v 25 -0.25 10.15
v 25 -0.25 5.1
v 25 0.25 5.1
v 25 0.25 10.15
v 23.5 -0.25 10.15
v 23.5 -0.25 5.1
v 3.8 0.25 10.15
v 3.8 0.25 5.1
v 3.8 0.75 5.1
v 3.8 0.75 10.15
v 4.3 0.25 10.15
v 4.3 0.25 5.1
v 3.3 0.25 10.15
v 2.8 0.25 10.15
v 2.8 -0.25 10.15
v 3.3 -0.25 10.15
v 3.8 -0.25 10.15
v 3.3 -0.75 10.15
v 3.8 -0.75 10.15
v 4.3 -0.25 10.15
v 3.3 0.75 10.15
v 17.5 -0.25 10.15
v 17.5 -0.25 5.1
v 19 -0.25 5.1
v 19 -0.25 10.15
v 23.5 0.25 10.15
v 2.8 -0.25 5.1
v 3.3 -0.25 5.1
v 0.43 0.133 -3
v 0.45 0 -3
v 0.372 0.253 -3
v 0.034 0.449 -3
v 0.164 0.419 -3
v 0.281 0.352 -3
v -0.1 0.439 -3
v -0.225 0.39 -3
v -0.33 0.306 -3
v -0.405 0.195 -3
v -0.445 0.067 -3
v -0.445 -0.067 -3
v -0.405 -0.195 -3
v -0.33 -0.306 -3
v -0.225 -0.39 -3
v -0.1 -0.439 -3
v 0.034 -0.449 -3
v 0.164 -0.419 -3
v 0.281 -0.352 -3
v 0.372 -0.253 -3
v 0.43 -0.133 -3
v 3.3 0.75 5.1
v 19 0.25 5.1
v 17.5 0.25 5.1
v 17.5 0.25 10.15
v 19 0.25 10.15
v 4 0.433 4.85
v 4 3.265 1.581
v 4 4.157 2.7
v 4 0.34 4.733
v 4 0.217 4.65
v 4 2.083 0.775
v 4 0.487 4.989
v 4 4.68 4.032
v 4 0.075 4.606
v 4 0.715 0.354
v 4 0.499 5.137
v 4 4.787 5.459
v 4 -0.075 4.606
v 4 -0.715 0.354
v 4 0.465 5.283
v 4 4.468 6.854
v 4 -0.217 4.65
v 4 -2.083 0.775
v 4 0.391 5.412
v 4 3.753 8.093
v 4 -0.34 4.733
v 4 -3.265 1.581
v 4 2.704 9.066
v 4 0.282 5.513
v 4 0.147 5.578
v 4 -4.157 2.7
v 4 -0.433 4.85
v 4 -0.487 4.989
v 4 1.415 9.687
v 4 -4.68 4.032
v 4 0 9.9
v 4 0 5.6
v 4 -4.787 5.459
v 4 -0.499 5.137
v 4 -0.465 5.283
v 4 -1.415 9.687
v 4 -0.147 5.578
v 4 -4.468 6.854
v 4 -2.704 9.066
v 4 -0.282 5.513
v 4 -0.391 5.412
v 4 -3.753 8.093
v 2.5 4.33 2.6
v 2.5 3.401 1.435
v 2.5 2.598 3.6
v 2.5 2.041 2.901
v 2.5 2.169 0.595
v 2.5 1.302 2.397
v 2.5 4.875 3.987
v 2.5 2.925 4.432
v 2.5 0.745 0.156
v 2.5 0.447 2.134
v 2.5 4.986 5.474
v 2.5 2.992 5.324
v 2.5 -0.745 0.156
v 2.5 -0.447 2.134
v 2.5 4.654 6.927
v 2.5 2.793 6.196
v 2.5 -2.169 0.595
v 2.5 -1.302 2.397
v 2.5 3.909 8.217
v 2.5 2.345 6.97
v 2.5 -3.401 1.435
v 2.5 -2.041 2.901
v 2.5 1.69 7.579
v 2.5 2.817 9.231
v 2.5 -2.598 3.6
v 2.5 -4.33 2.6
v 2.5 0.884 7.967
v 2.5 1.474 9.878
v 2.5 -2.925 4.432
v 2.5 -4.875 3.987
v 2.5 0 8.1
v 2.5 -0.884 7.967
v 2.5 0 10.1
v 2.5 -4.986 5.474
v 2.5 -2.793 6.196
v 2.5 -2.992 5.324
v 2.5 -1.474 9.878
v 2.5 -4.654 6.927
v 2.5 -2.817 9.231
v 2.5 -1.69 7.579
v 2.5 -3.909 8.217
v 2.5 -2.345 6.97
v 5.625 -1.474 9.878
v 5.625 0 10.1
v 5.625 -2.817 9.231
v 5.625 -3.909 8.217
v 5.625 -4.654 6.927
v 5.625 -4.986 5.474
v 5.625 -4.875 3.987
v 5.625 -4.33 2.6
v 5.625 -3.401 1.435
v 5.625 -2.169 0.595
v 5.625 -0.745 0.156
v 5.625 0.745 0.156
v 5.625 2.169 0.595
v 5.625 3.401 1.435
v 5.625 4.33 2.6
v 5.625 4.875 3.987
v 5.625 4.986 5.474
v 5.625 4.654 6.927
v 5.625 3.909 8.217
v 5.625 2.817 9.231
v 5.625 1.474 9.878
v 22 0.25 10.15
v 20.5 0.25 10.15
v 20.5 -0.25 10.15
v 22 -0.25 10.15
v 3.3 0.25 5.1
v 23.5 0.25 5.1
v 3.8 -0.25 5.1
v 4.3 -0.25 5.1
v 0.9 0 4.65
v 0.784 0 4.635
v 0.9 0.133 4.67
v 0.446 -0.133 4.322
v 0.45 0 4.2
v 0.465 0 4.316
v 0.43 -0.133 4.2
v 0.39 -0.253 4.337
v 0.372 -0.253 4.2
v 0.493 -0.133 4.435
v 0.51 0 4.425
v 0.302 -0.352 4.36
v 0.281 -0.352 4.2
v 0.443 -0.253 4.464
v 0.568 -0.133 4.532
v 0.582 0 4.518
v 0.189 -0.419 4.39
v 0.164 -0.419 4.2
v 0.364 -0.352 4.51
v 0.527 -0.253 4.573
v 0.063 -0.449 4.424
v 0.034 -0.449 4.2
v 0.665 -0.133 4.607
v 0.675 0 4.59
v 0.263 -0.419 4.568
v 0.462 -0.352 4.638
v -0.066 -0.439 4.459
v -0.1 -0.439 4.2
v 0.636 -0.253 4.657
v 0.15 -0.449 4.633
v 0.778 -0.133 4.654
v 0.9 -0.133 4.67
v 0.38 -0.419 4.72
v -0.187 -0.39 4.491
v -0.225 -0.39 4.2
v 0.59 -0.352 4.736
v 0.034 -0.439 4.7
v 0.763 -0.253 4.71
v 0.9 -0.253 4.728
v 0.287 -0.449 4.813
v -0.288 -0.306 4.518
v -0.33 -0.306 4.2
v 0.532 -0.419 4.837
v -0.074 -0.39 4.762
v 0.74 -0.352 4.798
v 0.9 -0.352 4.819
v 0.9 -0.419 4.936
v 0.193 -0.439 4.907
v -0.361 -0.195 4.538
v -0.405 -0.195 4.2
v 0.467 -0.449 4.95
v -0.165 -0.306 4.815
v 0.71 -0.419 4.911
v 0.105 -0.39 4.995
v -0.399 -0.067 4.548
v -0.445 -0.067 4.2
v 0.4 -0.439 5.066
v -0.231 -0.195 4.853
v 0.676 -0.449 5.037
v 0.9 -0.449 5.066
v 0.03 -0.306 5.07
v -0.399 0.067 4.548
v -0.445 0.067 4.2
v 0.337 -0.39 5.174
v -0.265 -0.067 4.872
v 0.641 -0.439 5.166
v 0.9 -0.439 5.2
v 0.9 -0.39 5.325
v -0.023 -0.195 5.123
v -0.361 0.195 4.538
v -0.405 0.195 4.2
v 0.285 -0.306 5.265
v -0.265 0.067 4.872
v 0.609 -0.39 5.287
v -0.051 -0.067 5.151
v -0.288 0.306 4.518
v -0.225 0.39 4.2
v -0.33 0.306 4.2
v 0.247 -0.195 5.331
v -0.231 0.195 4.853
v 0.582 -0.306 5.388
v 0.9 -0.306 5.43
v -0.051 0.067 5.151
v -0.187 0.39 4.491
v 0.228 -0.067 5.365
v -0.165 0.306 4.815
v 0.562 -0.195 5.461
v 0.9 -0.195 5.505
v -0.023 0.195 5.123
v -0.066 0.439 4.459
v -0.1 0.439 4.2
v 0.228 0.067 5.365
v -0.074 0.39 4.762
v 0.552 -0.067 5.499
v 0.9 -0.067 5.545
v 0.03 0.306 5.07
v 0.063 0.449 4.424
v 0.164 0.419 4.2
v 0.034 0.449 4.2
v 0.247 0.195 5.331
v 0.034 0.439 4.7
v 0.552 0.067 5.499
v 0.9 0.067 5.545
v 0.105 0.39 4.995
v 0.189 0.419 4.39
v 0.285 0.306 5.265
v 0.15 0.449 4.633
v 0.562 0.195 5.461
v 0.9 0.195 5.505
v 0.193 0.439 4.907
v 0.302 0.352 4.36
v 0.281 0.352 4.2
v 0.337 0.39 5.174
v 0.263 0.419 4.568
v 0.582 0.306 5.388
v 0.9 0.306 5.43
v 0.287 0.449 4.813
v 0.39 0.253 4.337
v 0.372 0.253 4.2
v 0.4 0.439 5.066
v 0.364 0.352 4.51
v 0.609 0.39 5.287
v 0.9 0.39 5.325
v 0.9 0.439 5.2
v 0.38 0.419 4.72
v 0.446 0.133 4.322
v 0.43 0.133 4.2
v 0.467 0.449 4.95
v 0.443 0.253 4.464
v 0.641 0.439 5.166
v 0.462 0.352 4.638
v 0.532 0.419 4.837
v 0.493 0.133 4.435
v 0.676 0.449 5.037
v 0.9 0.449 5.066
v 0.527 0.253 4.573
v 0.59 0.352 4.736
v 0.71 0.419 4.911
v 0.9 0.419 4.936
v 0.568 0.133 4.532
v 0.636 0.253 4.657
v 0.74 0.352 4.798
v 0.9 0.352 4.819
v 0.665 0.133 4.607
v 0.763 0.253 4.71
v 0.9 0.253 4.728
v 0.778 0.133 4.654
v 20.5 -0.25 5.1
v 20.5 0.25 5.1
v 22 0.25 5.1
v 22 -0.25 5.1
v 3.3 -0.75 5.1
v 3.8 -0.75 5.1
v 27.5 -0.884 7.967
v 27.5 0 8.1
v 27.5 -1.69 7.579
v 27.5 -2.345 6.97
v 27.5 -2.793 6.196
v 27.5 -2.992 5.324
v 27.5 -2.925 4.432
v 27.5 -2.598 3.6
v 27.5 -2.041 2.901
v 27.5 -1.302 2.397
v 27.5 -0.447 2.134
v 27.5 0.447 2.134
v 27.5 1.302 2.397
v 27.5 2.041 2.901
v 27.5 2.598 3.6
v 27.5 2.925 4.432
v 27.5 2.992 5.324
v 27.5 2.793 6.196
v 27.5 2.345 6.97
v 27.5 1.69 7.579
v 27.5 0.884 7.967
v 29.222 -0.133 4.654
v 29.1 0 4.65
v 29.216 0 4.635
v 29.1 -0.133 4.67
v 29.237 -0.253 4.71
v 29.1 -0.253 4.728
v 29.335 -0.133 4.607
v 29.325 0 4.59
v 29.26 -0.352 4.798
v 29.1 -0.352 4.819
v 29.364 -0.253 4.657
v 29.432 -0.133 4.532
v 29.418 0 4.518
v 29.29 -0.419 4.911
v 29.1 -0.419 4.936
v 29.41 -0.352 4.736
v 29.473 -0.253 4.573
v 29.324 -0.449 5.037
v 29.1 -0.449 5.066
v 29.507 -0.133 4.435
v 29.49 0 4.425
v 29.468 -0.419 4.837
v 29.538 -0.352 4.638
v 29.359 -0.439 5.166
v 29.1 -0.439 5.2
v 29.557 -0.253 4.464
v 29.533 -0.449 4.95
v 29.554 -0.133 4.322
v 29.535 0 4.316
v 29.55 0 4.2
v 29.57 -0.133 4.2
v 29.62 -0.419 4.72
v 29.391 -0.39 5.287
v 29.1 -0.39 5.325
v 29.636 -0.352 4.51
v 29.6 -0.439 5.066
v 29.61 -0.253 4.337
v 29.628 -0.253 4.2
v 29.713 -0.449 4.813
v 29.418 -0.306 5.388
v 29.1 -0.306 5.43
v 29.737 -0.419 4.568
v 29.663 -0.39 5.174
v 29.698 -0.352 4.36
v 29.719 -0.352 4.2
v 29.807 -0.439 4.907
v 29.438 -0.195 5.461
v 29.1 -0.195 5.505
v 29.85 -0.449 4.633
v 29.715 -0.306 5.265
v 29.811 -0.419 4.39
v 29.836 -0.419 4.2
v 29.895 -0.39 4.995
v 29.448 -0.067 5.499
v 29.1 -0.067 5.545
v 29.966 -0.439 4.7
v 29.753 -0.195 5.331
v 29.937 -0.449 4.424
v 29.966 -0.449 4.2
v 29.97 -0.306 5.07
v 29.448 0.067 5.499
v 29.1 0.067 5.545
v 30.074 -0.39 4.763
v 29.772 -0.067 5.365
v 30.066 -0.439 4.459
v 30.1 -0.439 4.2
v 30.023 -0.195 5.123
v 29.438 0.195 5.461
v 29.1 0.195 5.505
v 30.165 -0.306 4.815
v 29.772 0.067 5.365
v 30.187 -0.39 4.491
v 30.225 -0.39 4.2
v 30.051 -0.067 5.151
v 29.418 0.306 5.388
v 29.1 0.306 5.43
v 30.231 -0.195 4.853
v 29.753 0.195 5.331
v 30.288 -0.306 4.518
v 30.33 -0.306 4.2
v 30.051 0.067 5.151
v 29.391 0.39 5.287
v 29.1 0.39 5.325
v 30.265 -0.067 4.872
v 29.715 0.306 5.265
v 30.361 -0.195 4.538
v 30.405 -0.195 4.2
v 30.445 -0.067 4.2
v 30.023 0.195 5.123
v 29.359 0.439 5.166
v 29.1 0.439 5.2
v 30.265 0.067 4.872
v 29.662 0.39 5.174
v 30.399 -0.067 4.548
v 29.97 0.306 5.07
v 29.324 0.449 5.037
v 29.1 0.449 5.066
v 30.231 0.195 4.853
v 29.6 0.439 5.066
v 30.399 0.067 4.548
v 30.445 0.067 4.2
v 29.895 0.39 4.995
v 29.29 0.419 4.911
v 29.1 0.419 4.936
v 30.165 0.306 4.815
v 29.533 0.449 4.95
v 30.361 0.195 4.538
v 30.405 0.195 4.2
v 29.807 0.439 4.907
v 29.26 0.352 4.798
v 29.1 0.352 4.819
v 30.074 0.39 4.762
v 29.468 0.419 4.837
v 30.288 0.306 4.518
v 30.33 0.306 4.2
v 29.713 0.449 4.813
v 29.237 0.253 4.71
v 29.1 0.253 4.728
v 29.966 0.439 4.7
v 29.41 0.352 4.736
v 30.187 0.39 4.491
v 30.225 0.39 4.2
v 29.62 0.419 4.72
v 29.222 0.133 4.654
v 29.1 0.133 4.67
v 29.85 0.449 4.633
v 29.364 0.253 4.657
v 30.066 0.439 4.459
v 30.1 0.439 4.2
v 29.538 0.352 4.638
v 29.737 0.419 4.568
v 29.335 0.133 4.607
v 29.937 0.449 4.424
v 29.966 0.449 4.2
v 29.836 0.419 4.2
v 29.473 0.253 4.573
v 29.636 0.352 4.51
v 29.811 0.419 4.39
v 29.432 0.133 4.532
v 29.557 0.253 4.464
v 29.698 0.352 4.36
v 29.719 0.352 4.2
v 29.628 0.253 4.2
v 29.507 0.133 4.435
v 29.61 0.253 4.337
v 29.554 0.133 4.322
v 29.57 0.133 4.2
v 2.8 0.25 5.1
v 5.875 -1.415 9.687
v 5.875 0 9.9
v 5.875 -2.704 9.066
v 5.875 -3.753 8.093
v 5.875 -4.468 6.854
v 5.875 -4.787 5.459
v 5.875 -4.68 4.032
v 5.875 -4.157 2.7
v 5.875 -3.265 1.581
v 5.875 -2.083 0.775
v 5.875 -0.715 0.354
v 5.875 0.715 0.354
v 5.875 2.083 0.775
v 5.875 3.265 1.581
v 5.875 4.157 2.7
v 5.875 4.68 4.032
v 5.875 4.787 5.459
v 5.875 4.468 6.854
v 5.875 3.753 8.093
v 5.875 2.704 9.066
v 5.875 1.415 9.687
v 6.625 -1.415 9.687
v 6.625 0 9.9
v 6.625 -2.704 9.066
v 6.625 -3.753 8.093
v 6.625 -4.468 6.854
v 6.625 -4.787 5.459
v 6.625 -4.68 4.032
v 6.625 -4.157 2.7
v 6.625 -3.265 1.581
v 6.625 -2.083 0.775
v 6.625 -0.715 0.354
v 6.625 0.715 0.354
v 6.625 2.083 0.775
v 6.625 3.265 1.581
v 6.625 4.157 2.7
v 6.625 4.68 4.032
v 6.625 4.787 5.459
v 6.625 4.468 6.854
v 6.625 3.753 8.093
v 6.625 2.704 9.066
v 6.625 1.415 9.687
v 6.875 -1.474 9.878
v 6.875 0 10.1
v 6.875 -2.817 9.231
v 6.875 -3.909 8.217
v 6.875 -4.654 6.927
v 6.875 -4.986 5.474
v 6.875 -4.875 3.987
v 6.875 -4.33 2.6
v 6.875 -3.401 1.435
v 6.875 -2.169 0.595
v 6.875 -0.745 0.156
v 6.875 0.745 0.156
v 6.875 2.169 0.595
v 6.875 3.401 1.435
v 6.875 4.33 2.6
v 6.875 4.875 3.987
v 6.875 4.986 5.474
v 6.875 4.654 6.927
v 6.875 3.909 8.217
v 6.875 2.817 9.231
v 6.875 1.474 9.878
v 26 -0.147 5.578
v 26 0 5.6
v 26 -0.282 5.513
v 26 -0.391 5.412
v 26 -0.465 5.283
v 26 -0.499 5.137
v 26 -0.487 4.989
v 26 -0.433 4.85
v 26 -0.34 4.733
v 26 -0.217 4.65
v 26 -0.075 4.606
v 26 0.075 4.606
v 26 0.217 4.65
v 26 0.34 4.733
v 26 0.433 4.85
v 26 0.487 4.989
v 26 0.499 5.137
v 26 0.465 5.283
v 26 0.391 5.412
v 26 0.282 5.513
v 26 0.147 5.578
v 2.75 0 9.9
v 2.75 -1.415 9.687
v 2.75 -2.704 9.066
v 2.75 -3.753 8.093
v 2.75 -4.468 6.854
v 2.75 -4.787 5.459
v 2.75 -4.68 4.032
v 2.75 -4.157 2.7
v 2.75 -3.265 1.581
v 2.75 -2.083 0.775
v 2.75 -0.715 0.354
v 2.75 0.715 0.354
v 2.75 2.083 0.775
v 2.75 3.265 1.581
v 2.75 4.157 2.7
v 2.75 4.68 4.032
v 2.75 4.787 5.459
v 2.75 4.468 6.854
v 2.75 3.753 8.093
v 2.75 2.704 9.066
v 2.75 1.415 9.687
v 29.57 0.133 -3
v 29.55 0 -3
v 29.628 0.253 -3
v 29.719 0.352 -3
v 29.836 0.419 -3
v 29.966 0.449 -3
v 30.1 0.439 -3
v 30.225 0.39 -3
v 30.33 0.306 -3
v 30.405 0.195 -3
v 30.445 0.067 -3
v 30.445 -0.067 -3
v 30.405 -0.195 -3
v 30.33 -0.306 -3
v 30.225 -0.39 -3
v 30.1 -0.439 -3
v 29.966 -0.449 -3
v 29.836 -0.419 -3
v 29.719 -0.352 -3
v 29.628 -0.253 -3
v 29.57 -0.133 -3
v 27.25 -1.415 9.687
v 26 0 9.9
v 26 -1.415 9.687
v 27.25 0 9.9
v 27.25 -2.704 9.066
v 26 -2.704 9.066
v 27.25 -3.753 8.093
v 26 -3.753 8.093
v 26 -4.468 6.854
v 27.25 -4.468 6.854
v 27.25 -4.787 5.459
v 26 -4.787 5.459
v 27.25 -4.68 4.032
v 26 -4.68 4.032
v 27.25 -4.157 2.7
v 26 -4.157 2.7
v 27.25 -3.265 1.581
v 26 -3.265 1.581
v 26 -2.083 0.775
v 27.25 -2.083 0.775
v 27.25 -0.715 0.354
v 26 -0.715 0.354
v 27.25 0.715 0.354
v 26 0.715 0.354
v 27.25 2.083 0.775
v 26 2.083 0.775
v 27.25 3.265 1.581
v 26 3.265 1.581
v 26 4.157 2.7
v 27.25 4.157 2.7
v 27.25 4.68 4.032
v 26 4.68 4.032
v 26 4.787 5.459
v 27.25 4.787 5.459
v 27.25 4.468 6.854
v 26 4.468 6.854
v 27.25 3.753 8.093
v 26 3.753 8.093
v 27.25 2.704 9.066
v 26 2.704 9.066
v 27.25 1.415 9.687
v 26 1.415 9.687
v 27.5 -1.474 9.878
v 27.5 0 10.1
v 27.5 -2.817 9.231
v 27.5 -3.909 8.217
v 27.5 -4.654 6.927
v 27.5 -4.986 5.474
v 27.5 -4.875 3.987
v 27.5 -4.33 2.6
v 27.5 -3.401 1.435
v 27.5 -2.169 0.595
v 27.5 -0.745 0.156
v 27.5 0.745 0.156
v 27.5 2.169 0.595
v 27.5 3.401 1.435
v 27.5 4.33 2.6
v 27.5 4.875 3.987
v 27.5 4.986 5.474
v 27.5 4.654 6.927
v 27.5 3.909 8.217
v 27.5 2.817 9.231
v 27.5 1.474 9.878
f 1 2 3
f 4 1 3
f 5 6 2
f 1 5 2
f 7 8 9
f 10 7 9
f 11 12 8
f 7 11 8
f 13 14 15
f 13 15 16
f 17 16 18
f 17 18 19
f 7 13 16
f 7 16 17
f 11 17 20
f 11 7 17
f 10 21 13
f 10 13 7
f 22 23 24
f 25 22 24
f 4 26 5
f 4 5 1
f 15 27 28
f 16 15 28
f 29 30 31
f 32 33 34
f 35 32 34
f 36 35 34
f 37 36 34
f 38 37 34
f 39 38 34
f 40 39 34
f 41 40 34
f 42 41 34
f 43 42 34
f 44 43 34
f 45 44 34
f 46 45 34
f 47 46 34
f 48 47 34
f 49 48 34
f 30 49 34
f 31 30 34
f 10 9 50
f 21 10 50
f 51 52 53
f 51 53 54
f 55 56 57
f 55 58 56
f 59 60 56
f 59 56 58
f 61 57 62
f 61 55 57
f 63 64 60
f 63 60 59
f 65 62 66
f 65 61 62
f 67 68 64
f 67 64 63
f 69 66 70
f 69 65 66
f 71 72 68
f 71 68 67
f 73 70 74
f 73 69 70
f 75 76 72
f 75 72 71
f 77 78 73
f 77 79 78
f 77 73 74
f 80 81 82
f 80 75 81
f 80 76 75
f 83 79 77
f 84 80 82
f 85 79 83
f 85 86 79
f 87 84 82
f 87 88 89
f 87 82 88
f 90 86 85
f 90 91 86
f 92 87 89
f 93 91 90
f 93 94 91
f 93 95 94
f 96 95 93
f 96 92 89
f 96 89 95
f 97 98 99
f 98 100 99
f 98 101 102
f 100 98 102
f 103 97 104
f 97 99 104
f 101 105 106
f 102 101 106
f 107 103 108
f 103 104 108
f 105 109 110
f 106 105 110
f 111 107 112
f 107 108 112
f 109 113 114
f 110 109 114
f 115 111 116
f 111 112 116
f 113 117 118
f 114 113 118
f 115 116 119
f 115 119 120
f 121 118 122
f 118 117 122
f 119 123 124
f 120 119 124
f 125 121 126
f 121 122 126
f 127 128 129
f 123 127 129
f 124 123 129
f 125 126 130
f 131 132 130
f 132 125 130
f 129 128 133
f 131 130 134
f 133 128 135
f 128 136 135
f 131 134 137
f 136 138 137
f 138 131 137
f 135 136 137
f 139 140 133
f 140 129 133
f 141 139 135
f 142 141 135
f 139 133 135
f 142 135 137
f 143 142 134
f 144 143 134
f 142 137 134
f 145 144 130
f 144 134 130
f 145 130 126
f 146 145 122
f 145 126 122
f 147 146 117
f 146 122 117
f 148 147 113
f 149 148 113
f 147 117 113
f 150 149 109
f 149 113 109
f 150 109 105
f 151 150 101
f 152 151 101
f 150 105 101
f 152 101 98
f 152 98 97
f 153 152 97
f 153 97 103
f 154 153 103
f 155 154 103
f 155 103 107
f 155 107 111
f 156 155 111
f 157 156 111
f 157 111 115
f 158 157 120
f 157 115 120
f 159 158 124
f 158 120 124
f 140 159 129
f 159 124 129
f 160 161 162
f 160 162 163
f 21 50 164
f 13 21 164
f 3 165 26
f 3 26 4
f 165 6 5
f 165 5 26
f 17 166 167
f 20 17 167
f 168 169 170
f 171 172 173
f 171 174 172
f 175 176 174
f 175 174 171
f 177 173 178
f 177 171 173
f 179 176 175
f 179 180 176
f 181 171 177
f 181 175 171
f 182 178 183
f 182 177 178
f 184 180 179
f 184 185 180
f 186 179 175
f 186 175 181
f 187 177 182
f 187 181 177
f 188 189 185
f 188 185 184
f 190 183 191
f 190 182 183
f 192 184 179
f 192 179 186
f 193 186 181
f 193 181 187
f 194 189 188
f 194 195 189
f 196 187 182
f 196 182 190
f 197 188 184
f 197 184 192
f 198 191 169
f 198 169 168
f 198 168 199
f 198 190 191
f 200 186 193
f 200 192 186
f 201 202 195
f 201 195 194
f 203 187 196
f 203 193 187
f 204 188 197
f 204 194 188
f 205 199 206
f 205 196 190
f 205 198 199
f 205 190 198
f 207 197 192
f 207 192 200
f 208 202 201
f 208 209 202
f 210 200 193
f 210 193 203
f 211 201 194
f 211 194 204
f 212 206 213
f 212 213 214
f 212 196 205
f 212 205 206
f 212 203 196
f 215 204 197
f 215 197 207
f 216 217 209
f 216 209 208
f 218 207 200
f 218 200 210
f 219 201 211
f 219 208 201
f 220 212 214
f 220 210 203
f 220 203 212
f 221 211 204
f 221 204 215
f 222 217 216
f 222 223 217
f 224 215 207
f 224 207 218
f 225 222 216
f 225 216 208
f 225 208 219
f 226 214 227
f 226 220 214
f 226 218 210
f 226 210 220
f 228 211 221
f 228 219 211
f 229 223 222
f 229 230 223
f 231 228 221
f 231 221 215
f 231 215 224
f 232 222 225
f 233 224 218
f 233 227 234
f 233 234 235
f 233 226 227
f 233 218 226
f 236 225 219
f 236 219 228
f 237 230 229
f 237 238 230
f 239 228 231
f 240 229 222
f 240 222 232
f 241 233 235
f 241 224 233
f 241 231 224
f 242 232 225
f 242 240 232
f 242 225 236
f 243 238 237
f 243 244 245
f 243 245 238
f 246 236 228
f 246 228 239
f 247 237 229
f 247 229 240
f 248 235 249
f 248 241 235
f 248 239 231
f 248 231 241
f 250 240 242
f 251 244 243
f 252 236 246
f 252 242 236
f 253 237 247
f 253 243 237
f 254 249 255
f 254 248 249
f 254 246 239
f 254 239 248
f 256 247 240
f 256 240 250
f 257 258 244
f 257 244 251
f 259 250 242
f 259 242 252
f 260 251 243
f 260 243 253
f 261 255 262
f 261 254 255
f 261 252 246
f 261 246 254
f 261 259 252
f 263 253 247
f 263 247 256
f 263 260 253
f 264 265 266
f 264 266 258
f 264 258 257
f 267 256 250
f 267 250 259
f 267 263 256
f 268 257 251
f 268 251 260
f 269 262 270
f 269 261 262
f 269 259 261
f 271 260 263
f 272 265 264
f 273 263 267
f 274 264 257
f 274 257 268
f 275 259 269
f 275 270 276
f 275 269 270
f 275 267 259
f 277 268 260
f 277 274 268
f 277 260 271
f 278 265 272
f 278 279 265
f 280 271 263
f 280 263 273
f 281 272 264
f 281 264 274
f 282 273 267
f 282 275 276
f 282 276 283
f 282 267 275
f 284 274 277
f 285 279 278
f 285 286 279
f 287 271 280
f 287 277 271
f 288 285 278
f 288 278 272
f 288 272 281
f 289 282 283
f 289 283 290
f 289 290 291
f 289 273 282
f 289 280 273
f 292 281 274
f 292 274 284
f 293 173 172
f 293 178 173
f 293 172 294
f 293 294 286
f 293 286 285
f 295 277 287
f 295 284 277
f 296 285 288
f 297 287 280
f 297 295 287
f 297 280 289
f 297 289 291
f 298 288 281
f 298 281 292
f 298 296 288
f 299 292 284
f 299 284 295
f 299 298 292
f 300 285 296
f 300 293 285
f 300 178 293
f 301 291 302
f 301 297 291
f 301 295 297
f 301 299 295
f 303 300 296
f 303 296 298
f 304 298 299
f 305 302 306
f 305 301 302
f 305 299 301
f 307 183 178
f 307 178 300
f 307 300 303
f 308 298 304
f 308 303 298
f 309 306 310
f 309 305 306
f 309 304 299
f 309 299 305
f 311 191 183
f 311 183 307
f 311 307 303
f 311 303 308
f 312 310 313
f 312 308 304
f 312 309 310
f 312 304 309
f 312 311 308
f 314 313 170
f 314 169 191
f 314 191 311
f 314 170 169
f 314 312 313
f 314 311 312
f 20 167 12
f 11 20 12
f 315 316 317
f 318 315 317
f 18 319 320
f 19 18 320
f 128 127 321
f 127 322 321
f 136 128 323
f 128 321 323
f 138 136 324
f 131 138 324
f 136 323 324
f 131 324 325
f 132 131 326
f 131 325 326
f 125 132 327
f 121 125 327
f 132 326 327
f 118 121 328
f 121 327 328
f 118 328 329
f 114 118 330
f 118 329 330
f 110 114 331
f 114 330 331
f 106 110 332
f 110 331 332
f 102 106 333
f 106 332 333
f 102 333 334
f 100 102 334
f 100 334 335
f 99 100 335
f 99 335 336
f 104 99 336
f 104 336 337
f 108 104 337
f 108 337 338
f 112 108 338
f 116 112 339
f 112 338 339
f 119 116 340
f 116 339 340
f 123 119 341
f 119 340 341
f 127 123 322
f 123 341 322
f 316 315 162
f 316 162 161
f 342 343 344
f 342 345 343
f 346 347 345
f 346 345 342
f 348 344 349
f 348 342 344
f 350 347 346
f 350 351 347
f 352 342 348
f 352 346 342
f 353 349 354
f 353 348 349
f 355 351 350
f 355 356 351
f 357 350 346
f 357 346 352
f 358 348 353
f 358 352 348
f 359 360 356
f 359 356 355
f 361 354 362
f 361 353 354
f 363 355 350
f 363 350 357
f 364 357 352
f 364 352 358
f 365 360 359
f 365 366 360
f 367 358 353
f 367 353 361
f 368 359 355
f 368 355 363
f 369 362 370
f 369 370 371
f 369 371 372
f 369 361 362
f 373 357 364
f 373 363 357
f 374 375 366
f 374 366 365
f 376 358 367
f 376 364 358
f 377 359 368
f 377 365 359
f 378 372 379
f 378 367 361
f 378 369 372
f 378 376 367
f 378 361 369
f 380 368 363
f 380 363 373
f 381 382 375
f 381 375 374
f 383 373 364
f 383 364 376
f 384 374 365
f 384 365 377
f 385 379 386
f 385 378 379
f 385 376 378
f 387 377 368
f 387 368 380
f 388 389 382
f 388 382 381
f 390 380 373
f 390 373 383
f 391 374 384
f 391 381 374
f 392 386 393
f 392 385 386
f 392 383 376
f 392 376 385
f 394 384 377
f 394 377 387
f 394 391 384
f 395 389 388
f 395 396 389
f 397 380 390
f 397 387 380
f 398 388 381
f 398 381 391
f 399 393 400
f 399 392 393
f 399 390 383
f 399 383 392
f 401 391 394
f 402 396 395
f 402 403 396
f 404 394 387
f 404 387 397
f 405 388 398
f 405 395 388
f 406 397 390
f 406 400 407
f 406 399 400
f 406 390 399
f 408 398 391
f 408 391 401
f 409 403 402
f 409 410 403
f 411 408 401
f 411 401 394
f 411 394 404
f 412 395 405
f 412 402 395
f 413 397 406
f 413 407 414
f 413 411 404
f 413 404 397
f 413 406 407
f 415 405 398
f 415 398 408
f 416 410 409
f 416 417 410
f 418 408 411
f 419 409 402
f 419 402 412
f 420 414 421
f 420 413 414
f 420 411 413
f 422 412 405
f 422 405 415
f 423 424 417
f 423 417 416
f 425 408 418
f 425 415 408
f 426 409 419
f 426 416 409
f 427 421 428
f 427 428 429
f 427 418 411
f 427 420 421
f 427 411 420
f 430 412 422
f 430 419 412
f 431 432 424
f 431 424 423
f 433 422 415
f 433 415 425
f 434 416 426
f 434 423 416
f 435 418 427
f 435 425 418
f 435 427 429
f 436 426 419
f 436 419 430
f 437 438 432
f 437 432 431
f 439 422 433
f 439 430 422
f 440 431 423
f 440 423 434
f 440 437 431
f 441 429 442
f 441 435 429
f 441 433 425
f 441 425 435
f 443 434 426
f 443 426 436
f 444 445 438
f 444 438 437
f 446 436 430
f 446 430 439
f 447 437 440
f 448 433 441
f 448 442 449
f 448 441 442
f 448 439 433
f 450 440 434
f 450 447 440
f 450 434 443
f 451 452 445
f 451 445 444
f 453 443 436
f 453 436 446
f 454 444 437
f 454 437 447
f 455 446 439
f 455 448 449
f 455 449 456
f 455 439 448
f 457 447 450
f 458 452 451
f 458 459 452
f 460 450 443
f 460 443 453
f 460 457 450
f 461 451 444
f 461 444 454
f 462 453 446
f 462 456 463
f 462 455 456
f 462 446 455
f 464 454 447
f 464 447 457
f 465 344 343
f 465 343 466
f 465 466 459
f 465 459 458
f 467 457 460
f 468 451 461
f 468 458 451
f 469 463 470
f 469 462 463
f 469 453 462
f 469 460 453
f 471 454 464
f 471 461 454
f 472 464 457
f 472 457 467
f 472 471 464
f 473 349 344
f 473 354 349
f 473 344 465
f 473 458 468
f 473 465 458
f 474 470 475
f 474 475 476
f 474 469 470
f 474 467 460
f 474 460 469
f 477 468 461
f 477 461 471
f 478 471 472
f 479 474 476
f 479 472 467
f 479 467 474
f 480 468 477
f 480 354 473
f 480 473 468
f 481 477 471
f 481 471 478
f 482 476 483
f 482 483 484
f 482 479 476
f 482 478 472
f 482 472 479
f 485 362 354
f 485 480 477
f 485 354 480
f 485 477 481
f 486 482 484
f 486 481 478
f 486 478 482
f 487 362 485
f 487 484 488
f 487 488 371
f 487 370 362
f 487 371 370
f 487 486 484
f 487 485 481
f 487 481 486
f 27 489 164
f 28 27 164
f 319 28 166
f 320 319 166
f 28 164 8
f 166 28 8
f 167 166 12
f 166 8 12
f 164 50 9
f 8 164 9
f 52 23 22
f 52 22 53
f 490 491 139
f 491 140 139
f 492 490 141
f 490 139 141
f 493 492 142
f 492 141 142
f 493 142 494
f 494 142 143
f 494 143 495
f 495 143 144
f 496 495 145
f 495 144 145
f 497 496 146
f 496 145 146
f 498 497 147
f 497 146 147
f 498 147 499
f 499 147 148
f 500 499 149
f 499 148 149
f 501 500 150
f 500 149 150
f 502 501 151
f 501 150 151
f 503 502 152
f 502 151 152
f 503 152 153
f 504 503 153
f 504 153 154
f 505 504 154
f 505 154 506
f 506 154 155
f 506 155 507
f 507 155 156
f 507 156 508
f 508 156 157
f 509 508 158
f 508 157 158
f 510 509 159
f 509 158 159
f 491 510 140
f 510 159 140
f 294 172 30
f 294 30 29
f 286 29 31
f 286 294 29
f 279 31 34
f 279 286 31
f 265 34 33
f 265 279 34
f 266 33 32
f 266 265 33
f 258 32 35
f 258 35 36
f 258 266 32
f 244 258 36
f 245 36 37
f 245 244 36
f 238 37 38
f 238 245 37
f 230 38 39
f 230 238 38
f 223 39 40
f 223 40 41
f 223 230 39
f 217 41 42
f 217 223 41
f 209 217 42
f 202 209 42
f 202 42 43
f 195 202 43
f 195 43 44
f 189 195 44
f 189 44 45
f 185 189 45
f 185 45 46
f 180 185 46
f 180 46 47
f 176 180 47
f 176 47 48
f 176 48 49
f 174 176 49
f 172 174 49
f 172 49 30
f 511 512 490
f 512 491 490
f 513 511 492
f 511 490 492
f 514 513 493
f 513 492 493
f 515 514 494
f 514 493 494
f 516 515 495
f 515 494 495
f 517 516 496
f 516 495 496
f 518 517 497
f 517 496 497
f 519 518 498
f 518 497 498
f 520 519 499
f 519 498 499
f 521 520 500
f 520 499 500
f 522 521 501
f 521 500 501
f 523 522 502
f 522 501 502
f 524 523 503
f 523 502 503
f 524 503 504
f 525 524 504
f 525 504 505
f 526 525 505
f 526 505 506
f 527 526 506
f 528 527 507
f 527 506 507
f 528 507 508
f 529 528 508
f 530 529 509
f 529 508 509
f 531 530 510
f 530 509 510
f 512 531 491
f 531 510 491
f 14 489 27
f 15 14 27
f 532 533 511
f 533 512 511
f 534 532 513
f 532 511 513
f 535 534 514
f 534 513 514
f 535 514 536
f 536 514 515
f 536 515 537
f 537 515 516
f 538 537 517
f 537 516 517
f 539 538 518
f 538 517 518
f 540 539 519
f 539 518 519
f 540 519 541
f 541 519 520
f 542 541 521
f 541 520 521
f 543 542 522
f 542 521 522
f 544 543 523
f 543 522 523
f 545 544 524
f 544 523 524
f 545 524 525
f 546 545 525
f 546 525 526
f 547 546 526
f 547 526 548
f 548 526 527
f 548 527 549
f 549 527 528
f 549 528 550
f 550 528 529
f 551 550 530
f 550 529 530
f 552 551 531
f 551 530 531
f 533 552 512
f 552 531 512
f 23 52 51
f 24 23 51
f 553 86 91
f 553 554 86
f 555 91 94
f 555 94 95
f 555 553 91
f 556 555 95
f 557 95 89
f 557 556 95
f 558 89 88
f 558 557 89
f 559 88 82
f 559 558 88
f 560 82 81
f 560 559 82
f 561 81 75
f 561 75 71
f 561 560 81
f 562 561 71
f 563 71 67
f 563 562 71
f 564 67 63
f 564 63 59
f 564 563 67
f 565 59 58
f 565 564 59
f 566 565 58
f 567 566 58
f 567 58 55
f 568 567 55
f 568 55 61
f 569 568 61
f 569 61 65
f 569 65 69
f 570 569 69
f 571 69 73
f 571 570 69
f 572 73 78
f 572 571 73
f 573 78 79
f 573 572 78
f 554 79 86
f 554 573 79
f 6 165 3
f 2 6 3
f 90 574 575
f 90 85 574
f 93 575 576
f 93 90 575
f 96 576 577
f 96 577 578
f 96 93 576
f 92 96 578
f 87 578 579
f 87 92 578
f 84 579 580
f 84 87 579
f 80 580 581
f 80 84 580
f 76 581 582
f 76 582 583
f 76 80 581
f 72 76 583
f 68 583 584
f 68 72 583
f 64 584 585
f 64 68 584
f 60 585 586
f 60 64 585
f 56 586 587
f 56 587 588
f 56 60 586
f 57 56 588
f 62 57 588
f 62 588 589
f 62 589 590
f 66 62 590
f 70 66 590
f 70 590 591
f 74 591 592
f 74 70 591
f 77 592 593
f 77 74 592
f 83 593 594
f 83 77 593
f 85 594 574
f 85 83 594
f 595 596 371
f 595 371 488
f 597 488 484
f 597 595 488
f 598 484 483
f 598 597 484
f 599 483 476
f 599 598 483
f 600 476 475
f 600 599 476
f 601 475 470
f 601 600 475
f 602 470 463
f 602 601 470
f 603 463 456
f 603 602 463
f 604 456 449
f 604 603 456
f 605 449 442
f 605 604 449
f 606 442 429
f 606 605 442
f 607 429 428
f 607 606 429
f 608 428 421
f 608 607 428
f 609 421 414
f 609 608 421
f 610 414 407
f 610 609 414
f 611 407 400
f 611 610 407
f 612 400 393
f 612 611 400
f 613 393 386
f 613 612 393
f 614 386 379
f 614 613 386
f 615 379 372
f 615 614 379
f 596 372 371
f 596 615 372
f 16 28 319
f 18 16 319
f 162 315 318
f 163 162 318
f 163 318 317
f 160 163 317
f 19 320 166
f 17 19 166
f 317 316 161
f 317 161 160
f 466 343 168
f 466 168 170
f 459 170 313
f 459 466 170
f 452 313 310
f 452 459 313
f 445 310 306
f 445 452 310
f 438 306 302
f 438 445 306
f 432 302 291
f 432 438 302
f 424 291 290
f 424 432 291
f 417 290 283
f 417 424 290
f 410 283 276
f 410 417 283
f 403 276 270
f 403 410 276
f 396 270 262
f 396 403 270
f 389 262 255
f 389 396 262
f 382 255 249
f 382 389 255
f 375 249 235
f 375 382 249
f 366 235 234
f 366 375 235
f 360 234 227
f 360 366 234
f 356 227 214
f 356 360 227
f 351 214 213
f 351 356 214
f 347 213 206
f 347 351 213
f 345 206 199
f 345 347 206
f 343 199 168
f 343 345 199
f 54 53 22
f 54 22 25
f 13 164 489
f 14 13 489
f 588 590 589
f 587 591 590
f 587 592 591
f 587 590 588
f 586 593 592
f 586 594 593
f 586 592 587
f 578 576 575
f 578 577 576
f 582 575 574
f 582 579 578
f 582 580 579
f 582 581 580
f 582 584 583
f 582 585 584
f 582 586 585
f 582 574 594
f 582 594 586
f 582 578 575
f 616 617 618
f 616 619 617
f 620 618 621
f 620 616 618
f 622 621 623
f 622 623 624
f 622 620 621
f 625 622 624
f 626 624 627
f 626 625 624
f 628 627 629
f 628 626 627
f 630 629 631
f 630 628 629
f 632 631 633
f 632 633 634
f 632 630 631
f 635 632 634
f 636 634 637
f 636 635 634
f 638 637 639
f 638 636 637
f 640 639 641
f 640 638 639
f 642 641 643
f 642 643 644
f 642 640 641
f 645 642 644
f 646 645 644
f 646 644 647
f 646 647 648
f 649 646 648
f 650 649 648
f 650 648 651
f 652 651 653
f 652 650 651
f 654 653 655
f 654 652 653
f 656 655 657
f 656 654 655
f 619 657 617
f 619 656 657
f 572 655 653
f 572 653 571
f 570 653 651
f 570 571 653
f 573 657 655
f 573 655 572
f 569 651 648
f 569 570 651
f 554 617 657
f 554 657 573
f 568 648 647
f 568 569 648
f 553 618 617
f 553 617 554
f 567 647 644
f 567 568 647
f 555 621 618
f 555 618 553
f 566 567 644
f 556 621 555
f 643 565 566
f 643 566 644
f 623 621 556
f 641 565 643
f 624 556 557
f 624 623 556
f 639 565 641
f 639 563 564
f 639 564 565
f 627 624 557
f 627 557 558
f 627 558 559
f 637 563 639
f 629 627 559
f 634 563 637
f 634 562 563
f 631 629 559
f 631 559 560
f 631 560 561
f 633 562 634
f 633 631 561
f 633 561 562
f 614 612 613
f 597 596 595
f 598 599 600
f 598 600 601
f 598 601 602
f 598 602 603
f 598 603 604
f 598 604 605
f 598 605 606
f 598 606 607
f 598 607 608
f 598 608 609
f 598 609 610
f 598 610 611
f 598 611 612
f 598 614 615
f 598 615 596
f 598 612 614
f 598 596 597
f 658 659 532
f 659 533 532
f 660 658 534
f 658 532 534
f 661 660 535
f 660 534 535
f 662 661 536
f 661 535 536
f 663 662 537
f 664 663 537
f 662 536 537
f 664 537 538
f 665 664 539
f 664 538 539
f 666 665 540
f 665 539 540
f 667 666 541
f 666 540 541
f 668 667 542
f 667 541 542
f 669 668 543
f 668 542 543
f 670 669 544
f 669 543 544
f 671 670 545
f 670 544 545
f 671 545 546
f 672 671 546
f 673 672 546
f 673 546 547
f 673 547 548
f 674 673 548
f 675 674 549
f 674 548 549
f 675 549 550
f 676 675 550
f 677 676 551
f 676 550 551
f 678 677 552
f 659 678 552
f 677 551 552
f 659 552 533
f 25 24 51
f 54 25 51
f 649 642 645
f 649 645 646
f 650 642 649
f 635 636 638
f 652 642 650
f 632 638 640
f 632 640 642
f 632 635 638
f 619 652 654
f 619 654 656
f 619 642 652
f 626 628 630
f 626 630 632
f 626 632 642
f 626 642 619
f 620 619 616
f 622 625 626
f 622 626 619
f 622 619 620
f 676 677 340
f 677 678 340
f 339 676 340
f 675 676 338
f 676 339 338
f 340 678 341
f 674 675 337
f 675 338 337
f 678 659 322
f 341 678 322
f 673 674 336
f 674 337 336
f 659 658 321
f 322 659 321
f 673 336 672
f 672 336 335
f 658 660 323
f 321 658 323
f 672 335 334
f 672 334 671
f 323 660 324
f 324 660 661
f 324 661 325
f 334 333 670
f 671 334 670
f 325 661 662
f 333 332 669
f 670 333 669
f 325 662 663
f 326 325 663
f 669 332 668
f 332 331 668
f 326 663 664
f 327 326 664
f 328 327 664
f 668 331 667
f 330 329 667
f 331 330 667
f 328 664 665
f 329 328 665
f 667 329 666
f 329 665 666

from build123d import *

# Parameters (mm, degrees)
SKETCH_R    = 0.45
SKETCH004_W = 1.5
SKETCH004_H = 0.5
PAD_DEPTH   = 5.05


with BuildPart() as sweep_body:
    # Sweep: sweep along a path in Sketch001
    with BuildLine(Plane.XZ) as sweep_path:
        Line((0, -3), (0, 4.2))
        ThreePointArc((0, 4.2), (0.263601, 4.836394), (0.899993, 5.1))
        Line((0.899993, 5.1), (29.1, 5.1))
        ThreePointArc((29.1, 5.1), (29.736396, 4.836396), (30, 4.2))
        Line((30, 4.2), (30, -3))
    # Sketch → Sweep (sweep)
    with BuildSketch(Plane.XY.offset(-2)):
        Circle(SKETCH_R)
    sweep(path=sweep_path.line)


with BuildPart() as revolution:
    # Sketch002 → Revolution (revolve)
    with BuildSketch(Plane.XZ):
        Polygon((2.5, 10.1), (2.5, 8.1), (27.5, 8.1), (27.5, 10.1), (6.875, 10.1), (6.625, 9.9), (5.875, 9.9), (5.625, 10.1), align=None)
    revolve(axis=Axis((6.97588, 0, 5.1), (1, 0, 0)))


with BuildPart() as revolution001:
    # Sketch003 → Revolution001 (revolve)
    with BuildSketch(Plane.XZ):
        Polygon((2.75, 9.9), (4, 9.9), (4, 5.6), (26, 5.6), (26, 9.9), (27.25, 9.9), (27.25, 5.1), (2.75, 5.1), align=None)
    revolve(axis=Axis((6.97588, 0, 5.1), (1, 0, 0)))


with BuildPart() as pad:
    # Sketch004 → Pad (new body)
    with BuildSketch(Plane.XY.offset(5.1)):
        with Locations((24.25, 0)):
            Rectangle(SKETCH004_W, SKETCH004_H)
        with Locations((21.25, 0)):
            Rectangle(SKETCH004_W, SKETCH004_H)
        with Locations((18.25, 0)):
            Rectangle(SKETCH004_W, SKETCH004_H)
        Polygon((3.3, 0.25), (2.8, 0.25), (2.8, -0.25), (3.3, -0.25), (3.3, -0.75), (3.8, -0.75), (3.8, -0.25), (4.3, -0.25), (4.3, 0.25), (3.8, 0.25), (3.8, 0.75), (3.3, 0.75), align=None)
    extrude(amount=PAD_DEPTH)


solid = Compound([sweep_body.part, revolution.part, revolution001.part, pad.part])
